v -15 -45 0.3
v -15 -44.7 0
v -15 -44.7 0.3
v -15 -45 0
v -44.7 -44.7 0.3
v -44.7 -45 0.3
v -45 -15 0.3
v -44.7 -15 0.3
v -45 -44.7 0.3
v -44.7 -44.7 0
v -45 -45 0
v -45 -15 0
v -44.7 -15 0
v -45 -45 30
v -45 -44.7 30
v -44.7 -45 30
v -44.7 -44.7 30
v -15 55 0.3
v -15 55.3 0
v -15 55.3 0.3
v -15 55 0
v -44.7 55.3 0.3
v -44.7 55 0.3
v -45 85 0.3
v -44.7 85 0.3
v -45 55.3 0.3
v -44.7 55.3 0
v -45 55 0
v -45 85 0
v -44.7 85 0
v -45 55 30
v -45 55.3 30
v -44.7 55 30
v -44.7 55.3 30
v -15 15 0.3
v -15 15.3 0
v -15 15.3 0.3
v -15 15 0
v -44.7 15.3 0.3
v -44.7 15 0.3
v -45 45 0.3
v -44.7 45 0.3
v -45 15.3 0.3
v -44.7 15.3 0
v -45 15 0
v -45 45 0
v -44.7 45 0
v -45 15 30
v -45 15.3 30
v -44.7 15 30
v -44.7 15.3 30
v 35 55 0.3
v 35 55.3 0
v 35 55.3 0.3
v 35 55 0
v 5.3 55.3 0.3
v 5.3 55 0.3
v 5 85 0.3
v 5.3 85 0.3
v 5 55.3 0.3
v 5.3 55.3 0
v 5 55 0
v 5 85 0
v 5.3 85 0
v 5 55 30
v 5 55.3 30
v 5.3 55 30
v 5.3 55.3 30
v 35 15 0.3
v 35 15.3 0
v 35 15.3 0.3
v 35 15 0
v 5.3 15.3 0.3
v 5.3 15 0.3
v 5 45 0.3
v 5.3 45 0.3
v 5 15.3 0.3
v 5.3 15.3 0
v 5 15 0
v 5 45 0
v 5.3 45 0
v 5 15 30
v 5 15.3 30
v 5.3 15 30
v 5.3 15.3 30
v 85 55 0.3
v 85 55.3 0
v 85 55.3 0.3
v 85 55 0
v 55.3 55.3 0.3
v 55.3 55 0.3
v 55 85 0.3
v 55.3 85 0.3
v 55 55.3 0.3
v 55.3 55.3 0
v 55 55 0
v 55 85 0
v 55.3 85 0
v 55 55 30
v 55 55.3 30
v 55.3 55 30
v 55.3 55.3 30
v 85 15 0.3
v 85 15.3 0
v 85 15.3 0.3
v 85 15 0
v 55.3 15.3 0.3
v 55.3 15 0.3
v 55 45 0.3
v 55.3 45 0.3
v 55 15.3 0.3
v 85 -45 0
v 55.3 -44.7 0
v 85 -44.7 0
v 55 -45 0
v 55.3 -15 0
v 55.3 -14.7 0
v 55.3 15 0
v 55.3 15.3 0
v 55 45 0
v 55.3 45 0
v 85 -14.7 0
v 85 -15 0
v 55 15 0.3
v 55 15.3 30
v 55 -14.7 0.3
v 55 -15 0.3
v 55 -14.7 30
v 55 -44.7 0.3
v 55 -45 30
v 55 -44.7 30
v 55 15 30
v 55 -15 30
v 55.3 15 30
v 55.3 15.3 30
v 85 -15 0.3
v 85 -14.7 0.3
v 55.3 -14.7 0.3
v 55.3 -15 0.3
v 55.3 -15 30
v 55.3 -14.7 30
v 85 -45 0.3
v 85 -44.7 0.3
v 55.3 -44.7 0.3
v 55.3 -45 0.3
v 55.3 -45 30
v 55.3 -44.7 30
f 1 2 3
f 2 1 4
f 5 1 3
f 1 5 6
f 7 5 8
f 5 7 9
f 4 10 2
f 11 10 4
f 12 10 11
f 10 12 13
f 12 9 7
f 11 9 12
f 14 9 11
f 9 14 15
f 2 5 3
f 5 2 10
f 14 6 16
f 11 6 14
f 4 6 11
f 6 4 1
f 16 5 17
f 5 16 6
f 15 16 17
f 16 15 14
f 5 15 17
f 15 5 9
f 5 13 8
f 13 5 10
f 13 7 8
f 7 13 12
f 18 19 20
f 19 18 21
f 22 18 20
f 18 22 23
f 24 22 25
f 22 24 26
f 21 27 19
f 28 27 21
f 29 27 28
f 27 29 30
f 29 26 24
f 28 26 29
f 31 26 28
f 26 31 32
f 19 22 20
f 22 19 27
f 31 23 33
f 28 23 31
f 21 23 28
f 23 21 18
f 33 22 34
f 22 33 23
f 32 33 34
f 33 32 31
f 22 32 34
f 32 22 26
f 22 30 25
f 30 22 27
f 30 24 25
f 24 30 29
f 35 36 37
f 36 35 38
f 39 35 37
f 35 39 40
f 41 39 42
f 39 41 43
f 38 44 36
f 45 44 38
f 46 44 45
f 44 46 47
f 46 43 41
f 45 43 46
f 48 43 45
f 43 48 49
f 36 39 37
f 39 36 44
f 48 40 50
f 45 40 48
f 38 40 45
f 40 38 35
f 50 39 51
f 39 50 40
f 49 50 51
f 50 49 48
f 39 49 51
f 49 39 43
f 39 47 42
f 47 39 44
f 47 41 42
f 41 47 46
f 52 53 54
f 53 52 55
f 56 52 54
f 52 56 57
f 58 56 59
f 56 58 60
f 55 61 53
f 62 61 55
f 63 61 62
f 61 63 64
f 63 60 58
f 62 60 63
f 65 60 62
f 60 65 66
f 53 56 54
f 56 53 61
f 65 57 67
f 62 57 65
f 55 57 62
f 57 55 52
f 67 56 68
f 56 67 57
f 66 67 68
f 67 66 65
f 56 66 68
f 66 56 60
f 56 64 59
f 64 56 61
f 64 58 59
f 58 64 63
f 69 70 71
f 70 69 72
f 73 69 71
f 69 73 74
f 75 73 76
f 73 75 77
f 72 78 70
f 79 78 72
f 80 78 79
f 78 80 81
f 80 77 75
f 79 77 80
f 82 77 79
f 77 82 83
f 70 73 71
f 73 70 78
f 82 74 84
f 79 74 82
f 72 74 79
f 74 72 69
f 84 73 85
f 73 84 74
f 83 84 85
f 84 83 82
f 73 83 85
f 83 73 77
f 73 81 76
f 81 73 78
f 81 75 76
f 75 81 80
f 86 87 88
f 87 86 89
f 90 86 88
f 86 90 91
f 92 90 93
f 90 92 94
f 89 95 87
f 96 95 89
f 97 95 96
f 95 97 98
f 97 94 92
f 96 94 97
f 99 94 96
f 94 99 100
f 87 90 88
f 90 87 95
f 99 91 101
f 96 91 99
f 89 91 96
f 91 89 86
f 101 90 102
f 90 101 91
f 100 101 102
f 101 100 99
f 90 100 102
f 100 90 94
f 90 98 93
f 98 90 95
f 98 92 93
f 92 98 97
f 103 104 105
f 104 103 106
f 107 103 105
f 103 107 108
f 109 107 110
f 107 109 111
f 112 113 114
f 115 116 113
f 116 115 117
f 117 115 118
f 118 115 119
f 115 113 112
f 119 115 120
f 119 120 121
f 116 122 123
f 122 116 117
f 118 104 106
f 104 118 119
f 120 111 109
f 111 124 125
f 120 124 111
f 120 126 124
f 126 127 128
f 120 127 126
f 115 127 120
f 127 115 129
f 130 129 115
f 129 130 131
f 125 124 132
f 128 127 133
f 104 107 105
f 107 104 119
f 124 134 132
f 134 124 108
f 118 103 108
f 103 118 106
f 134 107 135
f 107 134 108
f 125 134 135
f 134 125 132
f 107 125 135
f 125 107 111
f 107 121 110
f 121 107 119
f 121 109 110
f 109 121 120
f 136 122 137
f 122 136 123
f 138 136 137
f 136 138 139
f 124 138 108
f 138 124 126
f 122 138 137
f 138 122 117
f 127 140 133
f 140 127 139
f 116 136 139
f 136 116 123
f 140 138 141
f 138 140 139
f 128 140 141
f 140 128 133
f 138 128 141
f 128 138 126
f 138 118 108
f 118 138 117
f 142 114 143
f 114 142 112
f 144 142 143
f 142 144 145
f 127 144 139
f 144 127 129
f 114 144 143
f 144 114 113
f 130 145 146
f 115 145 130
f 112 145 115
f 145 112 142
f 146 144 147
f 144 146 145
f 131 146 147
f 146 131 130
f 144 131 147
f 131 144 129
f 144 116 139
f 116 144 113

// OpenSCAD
module aligned_cube(size, aligned=[1,1,0])
{
    translate(-0.5*[size[0]*aligned[0], size[1]*aligned[1], size[2]*aligned[2]])
        cube(size);
}
module aligned_rounded_cube(size, r=5, rounding=[1,1,1], aligned=[1,1,0])
{

    translate(-0.5*[ ( size[0]*aligned[0] -2*r),
                     ( size[1]*aligned[1] -2*r),
                     ( size[2]*aligned[2] -2*r)])
    {

        _eps=min([size[0]/2,size[1]/2,size[2]/2, 0.001]);
        if( rounding == [1,1,1] ) {
            if(r>=min(size)) {
                echo("warning r is smaller than thickness for aligned cube");
            }
            minkowski() {
                cube([size[0] - 2*r, size[1] - 2*r, size[2]- 2*r]);
                sphere(r);
            }
        }else if( rounding == [1,1,0] ) {
            //cylinder rounding x/y
            if(r*2>=size[0] || r*2>=size[1] ) {
                echo("warning r is smaller than thickness for aligned cube");
            }
            minkowski() {
                translate([ 0,0,-r])
                    cube([size[0] - 2*r, size[1] - 2*r, size[2]-2*_eps]);
                cylinder(r=r,h=_eps);
            }
        }else if( rounding == [1,0,1] ) {
            //cylinder rounding x/z
            if(r*2>=size[0] || r*2>=size[2] ) {
                echo("warning r is smaller than thickness for aligned cube");
            }
            minkowski() {
                translate([ 0,-r,0])
                    cube([size[0] - 2*r, size[1] - 2*_eps, size[2]- 2*r]);
                rotate([90,0]) {
                    cylinder(r=r,h=_eps);
                }
            }
        }else if( rounding == [0,1,1] ) {
            //cylinder rounding x/z
            if(r*2>=size[1] || r*2>=size[2] ) {
                echo("warning r is smaller than thickness for aligned cube");
            }
            minkowski() {
                translate([-r,0,0])
                    cube([size[0] - 2*_eps , size[1] - 2*r, size[2]- 2*r]);
                rotate([0,90]) {
                    cylinder(r=r,h=_eps);
                }
            }
        }
    }
}


module rounded_cube(size, r, rounding=[0,0,0])
{
    aligned_rounded_cube(size, r, rounding=[0,0,0], aligned=[0,0,0]);
}

module axis(l=30, w=0.3) {
    color("red")
        cube([l,w,w]);
    color("blue")
        cube([w,w,l]);
    color("green")
        cube([w,l,w]);
    color("black")
        cube([w,w,w]);
}

// test show
translate([-45,45,0]) {
    translate([0,-90,0]) {
        axis();

        %cube(size=[10,10,10]);
        translate([0,-10,0])
        text(halign="center",valign="center", $fn=$fn, size=3,font="Linux Libertine O", "cube()");
    }

    translate([0,10,0]) {
        axis();

        %aligned_cube(size=[10,10,10], aligned=[1,1,1]);
        translate([0,-10,0])
        text(halign="center",valign="center", $fn=$fn, size=3,font="Linux Libertine O", "aligned_cube([1,1,1])");
    }

    translate([0,-30,0]) {
        axis();

        %aligned_rounded_cube(size=[10,10,10],r=1, aligned=[1,1,0]);
        translate([0,-10,0])
        text(halign="center",valign="center", $fn=$fn, size=3,font="Linux Libertine O", "aligned_rounded_cube([1,1,0])");
    }

    translate([50,10,0]) {
        $fn=32;
        axis();

        %aligned_rounded_cube(size=[10,10,10],r=1, aligned=[1,1,0]);
        translate([0,-10,0])
        text(halign="center",valign="center", $fn=$fn, size=3,font="Linux Libertine O", "aligned_rounded_cube(r=1)");
    }

    translate([50,-30,0]) {
        $fn=32;
        axis();

        %aligned_rounded_cube(size=[10,10,10],r=2, aligned=[1,1,0]);
        translate([0,-10,0])
        text(halign="center",valign="center", $fn=$fn, size=3,font="Linux Libertine O", "aligned_rounded_cube(r=2)");
    }

    translate([100,10,0]) {
        $fn=32;
        axis();

        %aligned_rounded_cube(size=[10,10,10],r=2, rounding=[1,1,1]);
        translate([0,-10,0])
        text(halign="center",valign="center", $fn=$fn, size=3,font="Linux Libertine O", "aligned_rounded_cube([1,1,1])");
    }
    translate([100,-30,0]) {
        $fn=32;
        axis();

        %aligned_rounded_cube(size=[10,10,10],r=2, rounding=[1,1,0]);
        translate([0,-10,0])
        text(halign="center",valign="center", $fn=$fn, size=3,font="Linux Libertine O", "aligned_rounded_cube([1,1,0])");
    }
    translate([100,-60,0]) {
        $fn=32;
        axis();

        %aligned_rounded_cube(size=[10,10,10],r=2, rounding=[1,0,1]);
        translate([0,-10,0])
        text(halign="center",valign="center", $fn=$fn, size=3,font="Linux Libertine O", "aligned_rounded_cube([1,0,1])");
    }
    translate([100,-90,0]) {
        $fn=32;
        axis();

        %aligned_rounded_cube(size=[10,10,10],r=2, rounding=[0,1,1]);
        translate([0,-10,0])
        text(halign="center",valign="center", $fn=$fn, size=3,font="Linux Libertine O", "aligned_rounded_cube([0,1,1])");
    }
}
